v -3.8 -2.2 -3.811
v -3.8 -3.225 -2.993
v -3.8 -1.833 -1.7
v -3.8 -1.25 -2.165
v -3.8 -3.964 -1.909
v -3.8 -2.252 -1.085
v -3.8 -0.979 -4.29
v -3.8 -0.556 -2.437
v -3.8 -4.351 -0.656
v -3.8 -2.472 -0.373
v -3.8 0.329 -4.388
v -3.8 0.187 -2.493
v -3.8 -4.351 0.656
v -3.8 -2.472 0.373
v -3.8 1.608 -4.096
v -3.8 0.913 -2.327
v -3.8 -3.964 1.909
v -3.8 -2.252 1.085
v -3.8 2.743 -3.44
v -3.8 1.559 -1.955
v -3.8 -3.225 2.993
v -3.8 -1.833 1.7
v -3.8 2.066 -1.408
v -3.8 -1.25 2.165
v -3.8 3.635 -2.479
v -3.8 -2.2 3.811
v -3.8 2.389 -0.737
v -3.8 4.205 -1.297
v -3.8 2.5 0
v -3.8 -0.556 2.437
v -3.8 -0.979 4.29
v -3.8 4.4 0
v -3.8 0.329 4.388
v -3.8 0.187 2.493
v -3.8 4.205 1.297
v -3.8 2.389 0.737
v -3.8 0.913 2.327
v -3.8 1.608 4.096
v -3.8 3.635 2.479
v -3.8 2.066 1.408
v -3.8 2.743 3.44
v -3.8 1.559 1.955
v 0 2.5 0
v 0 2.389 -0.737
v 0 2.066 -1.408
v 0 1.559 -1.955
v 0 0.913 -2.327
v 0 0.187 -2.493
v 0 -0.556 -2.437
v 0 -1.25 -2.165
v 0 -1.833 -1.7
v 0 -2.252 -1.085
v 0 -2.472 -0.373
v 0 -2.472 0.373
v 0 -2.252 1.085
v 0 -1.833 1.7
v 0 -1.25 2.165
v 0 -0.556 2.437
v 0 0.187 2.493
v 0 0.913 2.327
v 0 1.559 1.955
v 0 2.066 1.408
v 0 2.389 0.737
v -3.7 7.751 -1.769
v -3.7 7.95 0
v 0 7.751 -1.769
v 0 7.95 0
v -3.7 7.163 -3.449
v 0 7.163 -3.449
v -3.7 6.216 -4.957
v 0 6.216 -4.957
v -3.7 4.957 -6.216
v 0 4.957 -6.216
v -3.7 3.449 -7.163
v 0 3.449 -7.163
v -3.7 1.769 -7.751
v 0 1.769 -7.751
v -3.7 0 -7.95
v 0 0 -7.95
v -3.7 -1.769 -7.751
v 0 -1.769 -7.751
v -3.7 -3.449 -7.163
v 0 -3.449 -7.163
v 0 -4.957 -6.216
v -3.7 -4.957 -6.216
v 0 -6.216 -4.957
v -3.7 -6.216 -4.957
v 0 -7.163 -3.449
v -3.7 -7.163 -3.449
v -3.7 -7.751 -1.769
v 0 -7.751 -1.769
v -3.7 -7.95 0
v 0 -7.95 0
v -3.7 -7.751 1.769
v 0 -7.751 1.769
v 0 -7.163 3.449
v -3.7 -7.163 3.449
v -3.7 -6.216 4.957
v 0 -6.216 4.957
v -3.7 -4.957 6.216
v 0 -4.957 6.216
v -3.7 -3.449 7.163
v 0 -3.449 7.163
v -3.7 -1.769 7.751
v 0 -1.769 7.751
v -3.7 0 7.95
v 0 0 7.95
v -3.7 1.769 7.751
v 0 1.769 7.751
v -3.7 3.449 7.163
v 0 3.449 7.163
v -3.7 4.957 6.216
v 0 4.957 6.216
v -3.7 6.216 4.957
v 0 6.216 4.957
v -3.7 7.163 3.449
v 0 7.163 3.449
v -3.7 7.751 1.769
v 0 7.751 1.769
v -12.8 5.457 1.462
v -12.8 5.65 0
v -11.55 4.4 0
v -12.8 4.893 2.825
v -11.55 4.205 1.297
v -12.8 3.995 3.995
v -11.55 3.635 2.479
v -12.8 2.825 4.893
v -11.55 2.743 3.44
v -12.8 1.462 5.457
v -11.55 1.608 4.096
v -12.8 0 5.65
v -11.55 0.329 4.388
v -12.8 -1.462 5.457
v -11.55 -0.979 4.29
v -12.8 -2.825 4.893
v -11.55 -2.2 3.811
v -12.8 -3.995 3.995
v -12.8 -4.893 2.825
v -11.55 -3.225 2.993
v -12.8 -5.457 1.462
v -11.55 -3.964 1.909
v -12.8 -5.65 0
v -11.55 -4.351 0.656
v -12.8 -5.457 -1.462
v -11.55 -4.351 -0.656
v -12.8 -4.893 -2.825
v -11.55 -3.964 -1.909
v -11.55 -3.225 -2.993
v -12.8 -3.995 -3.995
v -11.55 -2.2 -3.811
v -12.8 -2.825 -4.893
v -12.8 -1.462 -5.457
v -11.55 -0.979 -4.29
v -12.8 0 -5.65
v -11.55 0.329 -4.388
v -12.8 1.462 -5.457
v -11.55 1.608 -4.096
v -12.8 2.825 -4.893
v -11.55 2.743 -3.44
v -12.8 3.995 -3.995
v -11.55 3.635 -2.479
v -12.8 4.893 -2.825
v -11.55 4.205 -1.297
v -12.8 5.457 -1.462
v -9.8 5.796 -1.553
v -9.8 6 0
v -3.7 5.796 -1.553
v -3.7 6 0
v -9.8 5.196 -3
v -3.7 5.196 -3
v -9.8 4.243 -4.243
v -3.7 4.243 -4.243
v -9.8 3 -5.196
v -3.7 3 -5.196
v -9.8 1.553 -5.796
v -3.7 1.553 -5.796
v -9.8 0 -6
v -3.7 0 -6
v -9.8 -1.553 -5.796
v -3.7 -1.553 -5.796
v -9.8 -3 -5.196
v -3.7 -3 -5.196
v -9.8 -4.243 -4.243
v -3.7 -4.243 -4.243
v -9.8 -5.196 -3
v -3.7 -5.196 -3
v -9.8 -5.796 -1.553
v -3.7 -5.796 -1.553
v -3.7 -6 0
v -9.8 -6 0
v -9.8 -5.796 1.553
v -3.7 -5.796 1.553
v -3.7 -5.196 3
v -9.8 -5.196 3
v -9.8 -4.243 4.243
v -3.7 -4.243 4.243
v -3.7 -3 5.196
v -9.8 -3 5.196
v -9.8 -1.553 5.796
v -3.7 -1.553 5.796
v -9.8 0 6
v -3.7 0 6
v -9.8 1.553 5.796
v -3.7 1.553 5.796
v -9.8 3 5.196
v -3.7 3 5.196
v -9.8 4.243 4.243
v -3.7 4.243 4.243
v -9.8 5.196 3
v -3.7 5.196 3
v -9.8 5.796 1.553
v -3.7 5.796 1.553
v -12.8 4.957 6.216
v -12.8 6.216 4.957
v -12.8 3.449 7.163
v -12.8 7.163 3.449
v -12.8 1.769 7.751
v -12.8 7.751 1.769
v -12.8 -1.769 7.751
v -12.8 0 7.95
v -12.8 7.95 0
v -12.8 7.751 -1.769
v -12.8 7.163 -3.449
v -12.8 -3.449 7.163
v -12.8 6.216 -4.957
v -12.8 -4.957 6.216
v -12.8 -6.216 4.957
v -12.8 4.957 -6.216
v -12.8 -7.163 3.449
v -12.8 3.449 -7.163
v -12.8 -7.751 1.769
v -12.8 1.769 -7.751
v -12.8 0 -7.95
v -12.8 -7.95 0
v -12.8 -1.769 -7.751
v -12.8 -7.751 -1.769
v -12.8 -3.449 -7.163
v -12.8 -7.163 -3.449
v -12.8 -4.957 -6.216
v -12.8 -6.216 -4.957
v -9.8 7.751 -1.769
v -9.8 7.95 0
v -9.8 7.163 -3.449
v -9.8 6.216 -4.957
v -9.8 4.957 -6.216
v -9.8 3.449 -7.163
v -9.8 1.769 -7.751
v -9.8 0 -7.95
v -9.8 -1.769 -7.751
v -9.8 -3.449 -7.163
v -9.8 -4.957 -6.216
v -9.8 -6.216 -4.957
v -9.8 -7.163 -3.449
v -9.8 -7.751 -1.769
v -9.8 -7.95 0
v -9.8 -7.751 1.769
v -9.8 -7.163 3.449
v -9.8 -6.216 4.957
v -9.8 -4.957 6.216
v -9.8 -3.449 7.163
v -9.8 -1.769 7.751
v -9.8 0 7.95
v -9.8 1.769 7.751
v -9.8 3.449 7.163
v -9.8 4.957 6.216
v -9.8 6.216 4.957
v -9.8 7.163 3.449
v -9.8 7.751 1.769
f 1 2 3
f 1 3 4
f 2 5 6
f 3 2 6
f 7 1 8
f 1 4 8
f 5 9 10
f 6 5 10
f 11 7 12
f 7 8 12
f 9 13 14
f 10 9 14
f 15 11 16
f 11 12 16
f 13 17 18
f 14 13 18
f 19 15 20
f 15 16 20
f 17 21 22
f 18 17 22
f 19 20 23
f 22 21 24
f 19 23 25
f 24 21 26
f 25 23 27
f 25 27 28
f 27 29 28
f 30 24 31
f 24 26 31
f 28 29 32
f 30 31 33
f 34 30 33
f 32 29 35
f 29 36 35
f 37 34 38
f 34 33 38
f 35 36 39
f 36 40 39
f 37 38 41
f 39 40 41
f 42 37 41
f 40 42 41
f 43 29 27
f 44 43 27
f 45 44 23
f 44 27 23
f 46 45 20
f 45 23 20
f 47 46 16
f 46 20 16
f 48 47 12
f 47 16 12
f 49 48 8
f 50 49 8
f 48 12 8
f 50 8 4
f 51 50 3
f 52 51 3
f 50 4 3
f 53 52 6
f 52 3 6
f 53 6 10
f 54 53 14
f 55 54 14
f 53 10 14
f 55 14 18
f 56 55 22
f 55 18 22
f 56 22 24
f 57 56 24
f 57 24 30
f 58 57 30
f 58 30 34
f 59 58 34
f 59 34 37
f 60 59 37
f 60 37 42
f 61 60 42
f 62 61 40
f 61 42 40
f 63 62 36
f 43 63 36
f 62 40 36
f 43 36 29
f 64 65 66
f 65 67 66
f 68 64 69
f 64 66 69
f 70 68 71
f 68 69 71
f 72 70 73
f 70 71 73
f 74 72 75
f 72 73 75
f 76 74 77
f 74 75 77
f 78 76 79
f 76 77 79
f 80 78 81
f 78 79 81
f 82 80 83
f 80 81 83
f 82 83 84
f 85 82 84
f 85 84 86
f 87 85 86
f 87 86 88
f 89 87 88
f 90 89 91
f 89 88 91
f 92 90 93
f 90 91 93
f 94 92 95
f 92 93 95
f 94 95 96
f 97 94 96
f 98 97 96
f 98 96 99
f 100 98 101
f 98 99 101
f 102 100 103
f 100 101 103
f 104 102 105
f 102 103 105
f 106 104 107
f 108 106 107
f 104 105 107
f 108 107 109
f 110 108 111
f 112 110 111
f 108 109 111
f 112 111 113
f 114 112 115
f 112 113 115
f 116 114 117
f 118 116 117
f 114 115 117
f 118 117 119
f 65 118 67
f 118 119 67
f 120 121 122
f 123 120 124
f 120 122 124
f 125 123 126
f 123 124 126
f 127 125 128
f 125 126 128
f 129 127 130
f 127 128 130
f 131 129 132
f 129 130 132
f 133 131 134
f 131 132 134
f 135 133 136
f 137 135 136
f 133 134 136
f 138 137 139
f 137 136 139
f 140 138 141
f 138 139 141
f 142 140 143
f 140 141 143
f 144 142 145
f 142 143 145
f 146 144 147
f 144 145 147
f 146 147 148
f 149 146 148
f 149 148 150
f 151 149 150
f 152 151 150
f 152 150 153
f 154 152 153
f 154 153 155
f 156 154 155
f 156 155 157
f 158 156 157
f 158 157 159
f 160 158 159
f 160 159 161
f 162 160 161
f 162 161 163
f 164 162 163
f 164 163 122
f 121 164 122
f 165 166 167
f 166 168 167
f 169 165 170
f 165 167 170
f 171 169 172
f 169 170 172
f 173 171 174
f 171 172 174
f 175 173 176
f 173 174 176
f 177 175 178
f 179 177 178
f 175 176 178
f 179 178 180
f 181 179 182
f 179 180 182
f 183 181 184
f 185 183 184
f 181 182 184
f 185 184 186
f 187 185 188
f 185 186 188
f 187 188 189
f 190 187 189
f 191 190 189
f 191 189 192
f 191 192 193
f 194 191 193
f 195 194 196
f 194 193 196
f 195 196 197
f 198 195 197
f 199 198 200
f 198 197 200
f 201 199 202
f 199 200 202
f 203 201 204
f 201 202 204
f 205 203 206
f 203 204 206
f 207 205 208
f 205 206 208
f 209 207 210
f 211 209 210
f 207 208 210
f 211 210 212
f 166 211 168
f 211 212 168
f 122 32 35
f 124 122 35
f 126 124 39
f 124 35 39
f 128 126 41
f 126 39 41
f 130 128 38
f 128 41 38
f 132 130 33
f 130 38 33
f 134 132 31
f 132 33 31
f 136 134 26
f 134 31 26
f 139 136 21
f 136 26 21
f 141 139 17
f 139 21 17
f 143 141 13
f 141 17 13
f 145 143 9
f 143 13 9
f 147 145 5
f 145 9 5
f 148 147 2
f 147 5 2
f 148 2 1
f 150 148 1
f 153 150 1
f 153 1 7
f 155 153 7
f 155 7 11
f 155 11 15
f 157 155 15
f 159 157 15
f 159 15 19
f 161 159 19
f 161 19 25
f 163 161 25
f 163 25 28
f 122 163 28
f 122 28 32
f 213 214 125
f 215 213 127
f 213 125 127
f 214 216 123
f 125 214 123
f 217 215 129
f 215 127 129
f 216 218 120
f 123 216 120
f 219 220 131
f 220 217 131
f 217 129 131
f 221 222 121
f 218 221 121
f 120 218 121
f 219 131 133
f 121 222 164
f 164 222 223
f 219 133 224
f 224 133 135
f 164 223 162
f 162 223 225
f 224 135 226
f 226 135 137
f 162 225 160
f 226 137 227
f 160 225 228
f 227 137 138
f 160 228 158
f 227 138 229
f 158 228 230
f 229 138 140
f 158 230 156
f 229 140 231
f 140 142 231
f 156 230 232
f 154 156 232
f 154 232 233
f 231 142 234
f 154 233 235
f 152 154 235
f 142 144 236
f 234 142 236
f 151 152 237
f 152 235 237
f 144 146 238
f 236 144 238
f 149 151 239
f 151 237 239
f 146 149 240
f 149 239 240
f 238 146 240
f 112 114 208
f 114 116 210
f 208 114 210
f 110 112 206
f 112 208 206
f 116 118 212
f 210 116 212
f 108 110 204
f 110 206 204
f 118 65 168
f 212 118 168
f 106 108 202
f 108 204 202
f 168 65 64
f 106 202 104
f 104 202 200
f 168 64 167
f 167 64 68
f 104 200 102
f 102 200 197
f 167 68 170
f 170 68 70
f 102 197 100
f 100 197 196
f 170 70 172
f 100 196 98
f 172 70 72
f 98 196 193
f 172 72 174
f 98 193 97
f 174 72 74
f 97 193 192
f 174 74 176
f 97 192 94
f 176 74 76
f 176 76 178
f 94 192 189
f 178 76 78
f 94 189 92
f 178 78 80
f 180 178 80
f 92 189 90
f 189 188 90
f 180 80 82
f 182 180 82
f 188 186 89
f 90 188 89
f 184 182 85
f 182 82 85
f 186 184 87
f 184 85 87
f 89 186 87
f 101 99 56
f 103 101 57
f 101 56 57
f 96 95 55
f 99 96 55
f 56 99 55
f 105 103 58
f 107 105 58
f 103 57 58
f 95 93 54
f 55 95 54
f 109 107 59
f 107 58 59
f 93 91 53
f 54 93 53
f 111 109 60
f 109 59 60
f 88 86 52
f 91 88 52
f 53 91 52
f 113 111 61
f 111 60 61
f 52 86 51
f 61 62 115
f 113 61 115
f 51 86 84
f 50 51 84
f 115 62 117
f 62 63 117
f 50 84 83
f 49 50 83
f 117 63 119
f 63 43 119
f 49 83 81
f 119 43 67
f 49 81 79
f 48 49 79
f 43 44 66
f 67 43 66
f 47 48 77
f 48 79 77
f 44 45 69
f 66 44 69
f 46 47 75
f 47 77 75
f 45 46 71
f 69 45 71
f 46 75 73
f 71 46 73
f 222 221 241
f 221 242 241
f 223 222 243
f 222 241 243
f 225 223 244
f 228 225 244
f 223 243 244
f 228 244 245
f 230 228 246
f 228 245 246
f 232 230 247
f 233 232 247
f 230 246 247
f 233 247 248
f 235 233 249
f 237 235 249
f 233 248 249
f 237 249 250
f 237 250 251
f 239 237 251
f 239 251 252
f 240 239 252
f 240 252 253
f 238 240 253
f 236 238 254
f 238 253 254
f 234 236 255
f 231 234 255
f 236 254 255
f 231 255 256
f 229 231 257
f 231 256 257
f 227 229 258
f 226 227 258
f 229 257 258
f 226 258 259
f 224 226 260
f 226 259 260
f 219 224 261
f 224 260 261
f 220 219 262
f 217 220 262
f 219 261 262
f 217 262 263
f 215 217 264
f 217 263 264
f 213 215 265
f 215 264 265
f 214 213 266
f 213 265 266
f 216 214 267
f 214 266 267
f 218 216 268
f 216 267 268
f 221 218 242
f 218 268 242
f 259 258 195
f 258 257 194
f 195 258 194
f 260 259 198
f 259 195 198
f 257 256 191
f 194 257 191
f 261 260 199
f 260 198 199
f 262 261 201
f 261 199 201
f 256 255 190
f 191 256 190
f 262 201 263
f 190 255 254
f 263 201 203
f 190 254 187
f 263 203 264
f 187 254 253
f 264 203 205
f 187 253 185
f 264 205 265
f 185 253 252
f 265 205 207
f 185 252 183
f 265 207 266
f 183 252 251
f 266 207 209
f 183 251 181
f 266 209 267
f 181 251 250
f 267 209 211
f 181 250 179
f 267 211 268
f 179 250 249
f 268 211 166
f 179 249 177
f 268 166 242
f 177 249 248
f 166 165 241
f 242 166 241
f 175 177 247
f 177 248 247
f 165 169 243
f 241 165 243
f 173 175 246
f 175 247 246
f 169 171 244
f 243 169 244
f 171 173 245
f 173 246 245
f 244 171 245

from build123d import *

# Parameters (mm, degrees)
HOLE_WIZARD_G1_81_D           = 8.8
HOLE_WIZARD_G1_81_DEPTH       = 9
HOLE_WIZARD_G1_81_CSINK_D     = 11.3
HOLE_WIZARD_G1_81_CSINK_ANGLE = 90


with BuildPart() as part:
    # Эскиз2 → Повернуть1 (revolve)
    with BuildSketch(Plane.XY):
        Polygon((-12.8, 2.5), (-12.8, 7.95), (-9.8, 7.95), (-9.8, 6), (-3.7, 6), (-3.7, 7.95), (0, 7.95), (0, 2.5), align=None)
    revolve(axis=Axis((0, 0, 0), (-1, 0, 0)))

    # Отверстие обработанное метчиком G1/81
    with Locations(Plane(origin=(-12.8, 0, 0), x_dir=(0, -1, 0), z_dir=(-1, 0, 0))):
        with Locations((0, 0)):
            CounterSinkHole(HOLE_WIZARD_G1_81_D / 2, HOLE_WIZARD_G1_81_CSINK_D / 2, depth=HOLE_WIZARD_G1_81_DEPTH, counter_sink_angle=HOLE_WIZARD_G1_81_CSINK_ANGLE)


solid = part.part
